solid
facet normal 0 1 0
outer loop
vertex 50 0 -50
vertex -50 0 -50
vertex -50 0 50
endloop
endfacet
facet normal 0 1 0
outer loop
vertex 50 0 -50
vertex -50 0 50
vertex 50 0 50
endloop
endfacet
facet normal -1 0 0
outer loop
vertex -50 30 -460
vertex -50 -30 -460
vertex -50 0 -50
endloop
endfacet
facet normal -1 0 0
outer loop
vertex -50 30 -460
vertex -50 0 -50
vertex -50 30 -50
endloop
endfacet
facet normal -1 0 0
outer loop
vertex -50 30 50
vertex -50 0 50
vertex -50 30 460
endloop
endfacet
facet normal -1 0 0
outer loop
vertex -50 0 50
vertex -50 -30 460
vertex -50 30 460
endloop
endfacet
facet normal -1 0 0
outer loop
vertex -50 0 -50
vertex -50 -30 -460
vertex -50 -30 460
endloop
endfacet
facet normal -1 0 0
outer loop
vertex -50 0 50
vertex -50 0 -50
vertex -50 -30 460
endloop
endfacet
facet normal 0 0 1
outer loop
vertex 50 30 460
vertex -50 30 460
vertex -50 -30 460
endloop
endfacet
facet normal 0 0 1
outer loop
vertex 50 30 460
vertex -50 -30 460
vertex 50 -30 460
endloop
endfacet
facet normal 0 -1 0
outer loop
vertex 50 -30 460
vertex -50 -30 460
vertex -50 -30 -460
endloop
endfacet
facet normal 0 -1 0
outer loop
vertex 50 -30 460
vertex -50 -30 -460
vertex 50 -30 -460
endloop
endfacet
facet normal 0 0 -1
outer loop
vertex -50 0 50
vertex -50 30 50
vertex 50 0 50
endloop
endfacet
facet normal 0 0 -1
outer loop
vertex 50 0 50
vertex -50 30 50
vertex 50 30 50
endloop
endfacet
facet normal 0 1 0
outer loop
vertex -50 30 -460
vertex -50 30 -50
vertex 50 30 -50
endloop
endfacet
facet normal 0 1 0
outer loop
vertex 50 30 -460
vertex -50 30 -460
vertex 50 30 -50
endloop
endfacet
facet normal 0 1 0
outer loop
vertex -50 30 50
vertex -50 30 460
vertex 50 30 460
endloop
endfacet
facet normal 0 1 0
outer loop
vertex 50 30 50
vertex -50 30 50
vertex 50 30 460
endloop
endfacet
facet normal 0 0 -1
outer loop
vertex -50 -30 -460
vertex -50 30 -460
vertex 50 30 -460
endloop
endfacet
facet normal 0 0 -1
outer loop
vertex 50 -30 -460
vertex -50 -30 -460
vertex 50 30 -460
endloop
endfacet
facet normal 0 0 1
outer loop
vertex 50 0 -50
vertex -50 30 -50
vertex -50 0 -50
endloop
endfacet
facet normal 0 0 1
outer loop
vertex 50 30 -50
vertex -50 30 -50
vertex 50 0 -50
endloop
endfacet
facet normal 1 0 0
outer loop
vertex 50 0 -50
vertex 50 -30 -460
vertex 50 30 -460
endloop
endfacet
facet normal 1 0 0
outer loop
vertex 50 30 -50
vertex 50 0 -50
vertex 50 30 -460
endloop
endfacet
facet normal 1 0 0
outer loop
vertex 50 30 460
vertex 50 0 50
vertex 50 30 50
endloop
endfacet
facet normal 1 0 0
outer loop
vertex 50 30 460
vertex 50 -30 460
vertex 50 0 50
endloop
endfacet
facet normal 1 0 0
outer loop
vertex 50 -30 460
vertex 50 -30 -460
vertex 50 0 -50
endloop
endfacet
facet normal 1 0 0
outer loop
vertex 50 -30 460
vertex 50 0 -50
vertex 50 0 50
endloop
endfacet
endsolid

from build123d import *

# Parameters (mm, degrees)
SKIZZE1_W                       = 100
SKIZZE1_H                       = 60
AUFSATZ_LINEAR_AUSTRAGEN1_DEPTH = 460
SKIZZE2_W                       = 100
SKIZZE2_H                       = 100
SCHNITT_LINEAR_AUSTRAGEN1_DEPTH = 30


with BuildPart() as part:
    # Skizze1 → Aufsatz-Linear austragen1 (new, symmetric)
    with BuildSketch(Plane.XY):
        Rectangle(SKIZZE1_W, SKIZZE1_H)
    extrude(amount=AUFSATZ_LINEAR_AUSTRAGEN1_DEPTH, both=True)

    # Skizze2 → Schnitt-Linear austragen1 (cut)
    with BuildSketch(Plane(origin=(0, 30, 0), x_dir=(1, 0, 0), z_dir=(0, 1, 0))):
        Rectangle(SKIZZE2_W, SKIZZE2_H)
    extrude(amount=-SCHNITT_LINEAR_AUSTRAGEN1_DEPTH, mode=Mode.SUBTRACT)


solid = part.part
